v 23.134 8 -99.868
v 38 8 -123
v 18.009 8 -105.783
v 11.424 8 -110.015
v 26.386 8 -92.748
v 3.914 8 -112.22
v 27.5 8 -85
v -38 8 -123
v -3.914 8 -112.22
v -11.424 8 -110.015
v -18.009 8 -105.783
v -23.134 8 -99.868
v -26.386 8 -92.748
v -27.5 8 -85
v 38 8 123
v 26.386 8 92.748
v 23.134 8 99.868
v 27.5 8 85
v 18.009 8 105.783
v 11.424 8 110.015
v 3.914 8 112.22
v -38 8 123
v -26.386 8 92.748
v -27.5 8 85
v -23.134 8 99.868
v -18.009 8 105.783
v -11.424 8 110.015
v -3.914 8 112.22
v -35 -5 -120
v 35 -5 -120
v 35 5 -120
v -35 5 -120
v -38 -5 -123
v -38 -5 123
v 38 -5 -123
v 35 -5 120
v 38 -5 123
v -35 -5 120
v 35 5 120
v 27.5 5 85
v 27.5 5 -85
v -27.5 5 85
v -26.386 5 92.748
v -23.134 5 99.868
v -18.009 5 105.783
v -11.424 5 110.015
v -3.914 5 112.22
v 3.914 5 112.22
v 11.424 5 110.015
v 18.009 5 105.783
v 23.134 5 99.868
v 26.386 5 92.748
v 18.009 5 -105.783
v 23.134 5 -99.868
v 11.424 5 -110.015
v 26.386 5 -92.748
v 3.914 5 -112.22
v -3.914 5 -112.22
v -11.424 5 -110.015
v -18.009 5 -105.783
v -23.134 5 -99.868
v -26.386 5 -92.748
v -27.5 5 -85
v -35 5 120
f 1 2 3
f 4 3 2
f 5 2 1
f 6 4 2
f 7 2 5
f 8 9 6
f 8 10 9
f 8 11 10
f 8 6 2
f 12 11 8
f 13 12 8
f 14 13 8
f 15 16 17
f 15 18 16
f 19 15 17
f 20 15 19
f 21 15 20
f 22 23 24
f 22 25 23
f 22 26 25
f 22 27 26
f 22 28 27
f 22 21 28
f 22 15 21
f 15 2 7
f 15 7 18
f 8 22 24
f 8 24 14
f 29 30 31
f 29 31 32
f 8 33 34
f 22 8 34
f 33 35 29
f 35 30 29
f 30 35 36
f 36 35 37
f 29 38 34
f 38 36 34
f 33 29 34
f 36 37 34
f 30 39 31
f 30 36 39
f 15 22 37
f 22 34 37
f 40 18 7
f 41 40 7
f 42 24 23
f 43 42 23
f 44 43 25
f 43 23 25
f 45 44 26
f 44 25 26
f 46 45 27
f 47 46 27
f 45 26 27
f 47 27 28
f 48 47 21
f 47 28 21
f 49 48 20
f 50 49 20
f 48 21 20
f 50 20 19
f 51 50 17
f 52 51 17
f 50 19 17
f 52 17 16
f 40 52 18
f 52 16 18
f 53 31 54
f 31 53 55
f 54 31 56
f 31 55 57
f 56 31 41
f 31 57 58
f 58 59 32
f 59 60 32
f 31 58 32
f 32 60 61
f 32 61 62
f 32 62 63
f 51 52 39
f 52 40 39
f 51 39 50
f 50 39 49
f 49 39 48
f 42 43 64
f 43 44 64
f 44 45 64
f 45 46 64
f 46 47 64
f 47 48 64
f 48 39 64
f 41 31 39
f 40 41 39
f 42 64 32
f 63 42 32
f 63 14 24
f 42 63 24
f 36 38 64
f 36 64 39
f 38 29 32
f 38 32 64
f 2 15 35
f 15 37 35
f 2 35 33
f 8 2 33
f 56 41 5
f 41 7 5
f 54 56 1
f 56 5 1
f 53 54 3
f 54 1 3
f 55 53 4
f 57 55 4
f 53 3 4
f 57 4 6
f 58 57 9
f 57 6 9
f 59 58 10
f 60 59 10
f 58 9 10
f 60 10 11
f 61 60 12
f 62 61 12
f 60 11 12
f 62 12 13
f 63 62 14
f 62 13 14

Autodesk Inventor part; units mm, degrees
sketch "Эскиз1" plane through (0, 0, 0) normal (0, 1, 0) x (-1, 0, 0)
  line L0 (35, 120) -> (-35, 120)
  line L1 (-35, 120) -> (-35, -120)
  line L2 (-35, -120) -> (35, -120)
  line L3 (35, -120) -> (35, 120)
  line L4 (35, 120) -> (-35, -120) construction
  line L5 (-35, 120) -> (35, -120) construction
  point P0 (0, 0)
  dimension "d0" = 70
  dimension "d1" = 240
extrude "Выдавливание1" add sketch "Эскиз1" along normal mid plane 10
shell "Оболочка1" thickness 3 outward yes removed faces 1 at (-11.6667, -5, -40)
sketch "Эскиз2" plane through (0, 8, 0) normal (0, 1, 0) x (1, 0, 0)
  line L0 (0, 85) -> (0, -85) construction
  line L1 (-27.5, 85) -> (-27.5, -85)
  line L2 (27.5, -85) -> (27.5, 85)
  arc A0 (27.5, 85) -> (-27.5, 85) centre (0, 85) ccw
  arc A1 (-27.5, -85) -> (27.5, -85) centre (0, -85) ccw
  point P0 (0, 0)
  point P1 (0, -112.5)
  point P2 (0, 112.5)
  dimension "d5" = 225
  dimension "d6" = 55
extrude "Выдавливание2" cut sketch "Эскиз2" against normal up to next
properties part number "Крышка_крепления_динамика"
